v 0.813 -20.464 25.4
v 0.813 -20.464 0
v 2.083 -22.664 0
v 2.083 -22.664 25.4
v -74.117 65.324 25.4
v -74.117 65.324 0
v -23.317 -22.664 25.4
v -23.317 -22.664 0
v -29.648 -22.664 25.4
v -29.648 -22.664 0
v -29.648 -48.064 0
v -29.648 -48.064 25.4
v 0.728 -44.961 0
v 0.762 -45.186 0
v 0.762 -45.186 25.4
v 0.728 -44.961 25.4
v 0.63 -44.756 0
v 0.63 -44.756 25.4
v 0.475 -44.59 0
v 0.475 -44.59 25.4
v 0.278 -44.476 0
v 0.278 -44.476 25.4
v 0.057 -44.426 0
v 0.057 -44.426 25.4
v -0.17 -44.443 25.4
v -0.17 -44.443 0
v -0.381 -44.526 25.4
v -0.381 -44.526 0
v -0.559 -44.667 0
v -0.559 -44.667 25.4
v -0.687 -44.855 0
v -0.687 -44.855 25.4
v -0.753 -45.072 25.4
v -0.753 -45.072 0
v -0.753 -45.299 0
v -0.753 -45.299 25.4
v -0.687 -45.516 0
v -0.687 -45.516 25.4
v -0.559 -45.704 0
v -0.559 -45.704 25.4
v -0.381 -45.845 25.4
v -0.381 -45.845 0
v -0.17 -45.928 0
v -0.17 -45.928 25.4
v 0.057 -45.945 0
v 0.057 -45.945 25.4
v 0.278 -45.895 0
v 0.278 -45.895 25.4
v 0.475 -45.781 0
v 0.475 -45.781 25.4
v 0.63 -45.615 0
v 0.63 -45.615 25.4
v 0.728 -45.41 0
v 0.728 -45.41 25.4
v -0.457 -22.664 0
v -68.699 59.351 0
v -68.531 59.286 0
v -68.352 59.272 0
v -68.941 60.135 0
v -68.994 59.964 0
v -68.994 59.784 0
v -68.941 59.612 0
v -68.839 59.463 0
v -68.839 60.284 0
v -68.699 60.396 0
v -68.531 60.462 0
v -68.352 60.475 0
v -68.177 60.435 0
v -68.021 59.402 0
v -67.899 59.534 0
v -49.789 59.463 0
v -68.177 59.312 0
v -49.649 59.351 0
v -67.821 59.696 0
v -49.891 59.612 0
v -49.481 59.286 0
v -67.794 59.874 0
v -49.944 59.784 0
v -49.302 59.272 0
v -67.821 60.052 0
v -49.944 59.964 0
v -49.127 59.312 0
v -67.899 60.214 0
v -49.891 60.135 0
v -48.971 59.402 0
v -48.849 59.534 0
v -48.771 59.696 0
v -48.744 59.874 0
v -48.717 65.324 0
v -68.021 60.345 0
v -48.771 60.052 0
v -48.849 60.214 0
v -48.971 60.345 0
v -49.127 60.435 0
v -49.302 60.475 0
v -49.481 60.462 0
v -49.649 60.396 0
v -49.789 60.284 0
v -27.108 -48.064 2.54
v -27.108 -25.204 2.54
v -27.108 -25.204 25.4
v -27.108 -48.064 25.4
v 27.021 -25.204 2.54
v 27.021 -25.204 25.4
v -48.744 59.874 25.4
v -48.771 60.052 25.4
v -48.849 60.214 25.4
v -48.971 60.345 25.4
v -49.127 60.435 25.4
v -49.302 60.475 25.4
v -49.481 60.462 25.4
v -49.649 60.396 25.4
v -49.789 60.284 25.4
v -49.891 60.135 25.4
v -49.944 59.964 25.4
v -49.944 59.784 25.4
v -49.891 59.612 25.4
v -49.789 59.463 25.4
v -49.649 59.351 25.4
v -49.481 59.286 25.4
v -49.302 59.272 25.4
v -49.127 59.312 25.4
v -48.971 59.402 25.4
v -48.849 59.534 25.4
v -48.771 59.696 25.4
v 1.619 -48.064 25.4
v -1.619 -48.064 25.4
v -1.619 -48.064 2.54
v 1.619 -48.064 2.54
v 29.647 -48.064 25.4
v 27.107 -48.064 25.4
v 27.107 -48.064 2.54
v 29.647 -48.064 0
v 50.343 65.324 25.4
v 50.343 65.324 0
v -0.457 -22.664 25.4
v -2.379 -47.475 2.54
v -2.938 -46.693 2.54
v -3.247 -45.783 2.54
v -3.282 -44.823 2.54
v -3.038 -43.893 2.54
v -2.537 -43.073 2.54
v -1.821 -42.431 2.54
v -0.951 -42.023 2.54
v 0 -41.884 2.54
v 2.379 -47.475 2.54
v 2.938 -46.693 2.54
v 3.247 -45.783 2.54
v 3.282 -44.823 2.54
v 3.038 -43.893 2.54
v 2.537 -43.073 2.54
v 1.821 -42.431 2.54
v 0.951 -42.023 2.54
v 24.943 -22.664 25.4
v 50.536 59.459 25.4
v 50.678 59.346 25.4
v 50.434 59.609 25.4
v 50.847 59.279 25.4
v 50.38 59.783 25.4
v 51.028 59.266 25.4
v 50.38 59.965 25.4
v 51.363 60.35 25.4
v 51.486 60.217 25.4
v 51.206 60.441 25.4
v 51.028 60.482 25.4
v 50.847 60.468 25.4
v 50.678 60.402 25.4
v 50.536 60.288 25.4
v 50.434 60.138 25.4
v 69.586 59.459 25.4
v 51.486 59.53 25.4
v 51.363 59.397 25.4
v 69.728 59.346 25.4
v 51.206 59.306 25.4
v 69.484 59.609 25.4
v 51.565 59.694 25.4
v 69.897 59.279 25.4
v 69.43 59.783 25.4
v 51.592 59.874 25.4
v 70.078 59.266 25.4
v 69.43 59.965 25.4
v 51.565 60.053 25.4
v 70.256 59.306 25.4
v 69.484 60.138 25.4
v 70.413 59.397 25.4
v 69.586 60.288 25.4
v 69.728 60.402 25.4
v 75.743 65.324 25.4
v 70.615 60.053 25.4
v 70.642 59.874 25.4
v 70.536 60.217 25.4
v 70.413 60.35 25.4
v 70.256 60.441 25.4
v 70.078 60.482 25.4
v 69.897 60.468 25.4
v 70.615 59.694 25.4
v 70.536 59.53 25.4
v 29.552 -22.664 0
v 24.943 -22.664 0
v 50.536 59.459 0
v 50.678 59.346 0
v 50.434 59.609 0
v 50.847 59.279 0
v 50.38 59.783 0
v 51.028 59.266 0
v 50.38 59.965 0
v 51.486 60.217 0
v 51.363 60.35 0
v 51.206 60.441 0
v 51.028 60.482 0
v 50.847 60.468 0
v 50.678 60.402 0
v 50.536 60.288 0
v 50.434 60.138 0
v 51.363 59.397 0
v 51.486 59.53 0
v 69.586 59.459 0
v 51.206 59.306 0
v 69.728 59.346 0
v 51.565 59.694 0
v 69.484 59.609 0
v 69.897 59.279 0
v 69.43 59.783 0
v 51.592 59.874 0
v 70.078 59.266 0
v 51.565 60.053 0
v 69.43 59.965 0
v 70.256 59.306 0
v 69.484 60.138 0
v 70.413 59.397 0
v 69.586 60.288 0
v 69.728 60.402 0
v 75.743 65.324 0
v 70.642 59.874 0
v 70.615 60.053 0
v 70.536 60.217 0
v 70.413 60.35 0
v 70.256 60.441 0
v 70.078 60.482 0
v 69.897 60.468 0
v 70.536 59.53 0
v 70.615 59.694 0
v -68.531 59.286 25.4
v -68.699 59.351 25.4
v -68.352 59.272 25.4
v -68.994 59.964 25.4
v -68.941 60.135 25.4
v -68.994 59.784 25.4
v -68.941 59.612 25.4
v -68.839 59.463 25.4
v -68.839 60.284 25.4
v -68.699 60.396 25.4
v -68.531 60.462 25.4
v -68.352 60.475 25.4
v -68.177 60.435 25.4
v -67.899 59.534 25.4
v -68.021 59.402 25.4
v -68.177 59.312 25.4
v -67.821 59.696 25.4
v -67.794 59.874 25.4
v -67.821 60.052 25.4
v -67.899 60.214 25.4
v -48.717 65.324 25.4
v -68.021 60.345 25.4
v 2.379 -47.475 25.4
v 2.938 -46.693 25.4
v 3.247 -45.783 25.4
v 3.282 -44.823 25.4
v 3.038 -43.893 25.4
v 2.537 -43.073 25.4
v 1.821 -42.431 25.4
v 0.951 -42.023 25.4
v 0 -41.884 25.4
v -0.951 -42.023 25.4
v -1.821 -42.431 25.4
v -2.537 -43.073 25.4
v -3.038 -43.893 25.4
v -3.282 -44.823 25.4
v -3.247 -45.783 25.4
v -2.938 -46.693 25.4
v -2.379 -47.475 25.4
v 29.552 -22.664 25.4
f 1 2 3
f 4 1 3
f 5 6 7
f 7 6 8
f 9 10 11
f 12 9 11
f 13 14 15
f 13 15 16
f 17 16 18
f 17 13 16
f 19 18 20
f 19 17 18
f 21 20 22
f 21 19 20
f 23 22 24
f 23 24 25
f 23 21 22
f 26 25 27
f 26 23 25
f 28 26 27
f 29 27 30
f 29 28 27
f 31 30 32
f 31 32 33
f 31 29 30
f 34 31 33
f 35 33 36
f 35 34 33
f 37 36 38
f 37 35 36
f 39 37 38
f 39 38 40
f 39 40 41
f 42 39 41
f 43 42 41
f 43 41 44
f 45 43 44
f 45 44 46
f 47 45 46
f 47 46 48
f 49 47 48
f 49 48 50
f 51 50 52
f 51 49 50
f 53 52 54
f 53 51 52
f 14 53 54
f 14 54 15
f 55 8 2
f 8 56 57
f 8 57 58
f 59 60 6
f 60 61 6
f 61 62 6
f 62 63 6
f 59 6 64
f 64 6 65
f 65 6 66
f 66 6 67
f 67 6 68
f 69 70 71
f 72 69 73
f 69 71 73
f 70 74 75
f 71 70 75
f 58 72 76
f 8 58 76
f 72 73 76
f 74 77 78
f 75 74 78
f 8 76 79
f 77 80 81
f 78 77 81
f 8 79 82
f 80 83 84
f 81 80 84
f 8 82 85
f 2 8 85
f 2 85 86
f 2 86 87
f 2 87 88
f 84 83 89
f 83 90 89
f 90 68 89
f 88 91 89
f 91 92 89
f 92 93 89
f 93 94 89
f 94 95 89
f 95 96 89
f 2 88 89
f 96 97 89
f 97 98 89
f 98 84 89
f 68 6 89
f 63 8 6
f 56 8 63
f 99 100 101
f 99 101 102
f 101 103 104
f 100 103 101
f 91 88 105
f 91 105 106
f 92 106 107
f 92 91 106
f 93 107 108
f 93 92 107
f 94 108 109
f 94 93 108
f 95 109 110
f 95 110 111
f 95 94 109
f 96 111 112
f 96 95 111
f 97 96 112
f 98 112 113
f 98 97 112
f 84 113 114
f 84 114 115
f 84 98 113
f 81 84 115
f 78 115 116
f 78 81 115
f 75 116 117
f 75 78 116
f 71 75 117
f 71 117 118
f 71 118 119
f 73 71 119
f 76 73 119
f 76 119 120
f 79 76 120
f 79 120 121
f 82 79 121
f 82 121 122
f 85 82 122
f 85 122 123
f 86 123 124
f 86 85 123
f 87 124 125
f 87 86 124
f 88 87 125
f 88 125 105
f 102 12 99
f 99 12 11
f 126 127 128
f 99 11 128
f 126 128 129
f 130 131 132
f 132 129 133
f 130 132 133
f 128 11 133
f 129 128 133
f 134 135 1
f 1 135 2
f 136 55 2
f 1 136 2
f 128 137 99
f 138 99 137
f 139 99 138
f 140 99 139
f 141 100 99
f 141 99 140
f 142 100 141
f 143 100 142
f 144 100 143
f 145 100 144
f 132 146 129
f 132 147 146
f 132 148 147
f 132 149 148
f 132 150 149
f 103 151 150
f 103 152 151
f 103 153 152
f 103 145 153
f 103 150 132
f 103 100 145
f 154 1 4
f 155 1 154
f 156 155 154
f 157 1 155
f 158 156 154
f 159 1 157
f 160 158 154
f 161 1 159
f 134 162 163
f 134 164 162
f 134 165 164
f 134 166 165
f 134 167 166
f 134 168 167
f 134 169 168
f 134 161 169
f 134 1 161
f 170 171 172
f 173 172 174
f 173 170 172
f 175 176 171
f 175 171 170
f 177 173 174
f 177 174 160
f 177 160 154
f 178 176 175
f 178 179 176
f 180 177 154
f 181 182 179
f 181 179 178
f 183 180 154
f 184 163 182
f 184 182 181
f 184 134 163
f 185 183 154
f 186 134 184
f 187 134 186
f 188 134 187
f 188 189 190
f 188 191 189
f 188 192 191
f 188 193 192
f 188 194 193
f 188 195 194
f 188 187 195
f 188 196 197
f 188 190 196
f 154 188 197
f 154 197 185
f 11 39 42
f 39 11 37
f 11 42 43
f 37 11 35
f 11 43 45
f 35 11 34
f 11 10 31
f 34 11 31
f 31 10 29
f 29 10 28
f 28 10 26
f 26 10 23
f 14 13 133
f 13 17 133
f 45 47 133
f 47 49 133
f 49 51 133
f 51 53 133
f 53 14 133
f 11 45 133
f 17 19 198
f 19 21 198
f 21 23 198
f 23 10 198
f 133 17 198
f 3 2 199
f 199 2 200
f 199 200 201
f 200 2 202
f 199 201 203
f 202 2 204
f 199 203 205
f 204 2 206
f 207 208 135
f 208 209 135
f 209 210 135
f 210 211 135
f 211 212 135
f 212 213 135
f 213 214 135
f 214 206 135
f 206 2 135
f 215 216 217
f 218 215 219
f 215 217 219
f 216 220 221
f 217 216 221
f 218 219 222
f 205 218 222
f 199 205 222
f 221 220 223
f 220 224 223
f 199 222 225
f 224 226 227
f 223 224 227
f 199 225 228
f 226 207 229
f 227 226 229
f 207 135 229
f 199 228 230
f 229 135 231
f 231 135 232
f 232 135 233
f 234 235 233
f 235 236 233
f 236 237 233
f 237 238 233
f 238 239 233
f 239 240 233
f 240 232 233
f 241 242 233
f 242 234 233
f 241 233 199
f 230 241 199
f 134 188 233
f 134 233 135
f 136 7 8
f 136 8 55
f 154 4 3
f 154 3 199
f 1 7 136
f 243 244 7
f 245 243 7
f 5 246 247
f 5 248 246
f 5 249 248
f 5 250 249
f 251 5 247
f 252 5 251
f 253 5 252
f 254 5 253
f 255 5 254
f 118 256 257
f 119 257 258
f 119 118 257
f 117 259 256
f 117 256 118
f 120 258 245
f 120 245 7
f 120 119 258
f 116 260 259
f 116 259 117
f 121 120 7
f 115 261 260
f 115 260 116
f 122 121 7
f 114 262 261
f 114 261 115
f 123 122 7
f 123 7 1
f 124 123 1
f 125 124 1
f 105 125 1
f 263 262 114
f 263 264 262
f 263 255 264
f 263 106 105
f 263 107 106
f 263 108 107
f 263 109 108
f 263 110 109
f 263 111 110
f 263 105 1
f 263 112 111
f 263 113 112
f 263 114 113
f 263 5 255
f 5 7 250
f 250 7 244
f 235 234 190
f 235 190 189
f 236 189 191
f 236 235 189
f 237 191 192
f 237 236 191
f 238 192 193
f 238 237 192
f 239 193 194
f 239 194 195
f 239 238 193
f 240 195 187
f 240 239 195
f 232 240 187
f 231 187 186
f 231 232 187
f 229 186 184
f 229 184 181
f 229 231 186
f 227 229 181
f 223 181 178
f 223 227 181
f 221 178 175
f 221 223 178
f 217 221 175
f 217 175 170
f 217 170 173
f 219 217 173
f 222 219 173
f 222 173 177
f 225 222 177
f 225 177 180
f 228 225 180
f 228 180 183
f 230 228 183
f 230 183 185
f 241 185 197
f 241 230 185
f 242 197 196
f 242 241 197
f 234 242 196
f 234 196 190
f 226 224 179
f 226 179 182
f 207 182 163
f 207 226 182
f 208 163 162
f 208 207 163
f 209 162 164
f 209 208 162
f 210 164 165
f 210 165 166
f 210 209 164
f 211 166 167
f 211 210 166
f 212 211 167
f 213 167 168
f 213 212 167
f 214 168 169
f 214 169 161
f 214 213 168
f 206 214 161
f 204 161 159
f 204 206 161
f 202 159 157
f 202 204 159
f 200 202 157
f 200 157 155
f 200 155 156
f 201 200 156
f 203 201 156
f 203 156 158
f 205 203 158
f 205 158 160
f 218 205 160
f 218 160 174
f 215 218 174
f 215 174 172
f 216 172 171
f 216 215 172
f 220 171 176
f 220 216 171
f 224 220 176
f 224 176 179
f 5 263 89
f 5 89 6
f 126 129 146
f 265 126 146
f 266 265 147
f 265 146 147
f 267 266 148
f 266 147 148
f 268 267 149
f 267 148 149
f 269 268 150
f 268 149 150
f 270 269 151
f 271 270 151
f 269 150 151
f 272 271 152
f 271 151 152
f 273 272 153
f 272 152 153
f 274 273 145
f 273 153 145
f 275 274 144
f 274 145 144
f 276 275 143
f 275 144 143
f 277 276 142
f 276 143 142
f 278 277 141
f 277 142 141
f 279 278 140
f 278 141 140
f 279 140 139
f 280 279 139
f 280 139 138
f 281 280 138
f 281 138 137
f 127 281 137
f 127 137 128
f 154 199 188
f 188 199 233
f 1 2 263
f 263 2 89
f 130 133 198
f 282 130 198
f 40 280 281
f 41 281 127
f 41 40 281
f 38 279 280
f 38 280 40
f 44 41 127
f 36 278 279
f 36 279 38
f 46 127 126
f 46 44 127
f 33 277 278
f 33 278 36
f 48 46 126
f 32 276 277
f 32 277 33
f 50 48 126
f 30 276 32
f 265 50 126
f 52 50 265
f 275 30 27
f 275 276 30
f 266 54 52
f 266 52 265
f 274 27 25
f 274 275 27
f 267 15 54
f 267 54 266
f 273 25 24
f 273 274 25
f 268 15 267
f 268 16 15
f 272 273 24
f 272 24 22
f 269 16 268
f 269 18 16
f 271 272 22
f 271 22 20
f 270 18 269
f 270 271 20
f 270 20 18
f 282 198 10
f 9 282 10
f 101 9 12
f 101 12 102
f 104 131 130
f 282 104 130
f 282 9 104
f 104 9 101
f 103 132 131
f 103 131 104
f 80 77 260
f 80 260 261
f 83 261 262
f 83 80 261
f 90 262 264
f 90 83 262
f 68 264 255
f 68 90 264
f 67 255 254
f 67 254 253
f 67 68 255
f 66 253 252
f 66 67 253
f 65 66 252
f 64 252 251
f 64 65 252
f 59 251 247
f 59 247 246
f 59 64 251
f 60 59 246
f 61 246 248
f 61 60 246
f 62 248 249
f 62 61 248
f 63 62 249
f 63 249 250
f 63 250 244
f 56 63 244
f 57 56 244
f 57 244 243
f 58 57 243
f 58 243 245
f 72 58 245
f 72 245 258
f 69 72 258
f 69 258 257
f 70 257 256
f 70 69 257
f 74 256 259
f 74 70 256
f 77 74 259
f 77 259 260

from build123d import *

# Parameters (mm, degrees)
F0_R     = 0.60325
F1_DEPTH = 25.4
F0_R_2   = 0.6096
F2_DEPTH = 25.4
F0_W     = 58.928
F0_H     = 25.1030587018
F0_R_3   = 0.762
F3_DEPTH = 25.4
F4_T     = 2.54


# Not quite as in the source:
# - a shell that OpenCascade refuses in one call is made with other operations: the cavity is built on its own and cut out


with BuildPart() as f1:
    # F0 (on Top) → F1 (new body)
    with BuildSketch(Plane.XY):
        Polygon((-74.1166336828, 65.3244355693), (-23.3166336828, -22.6637454552), (-0.4566336828, -22.6637454552), (0.8133663172, -20.4640409296), (-48.7166336828, 65.3244355693), align=None)
        with Locations((-68.3971781588, 59.8737336695)):
            Circle(F0_R, mode=Mode.SUBTRACT)
        with Locations((-49.3471781588, 59.8737336695)):
            Circle(F0_R, mode=Mode.SUBTRACT)
    extrude(amount=F1_DEPTH)


with BuildPart() as f1b:
    # F0 (on Top) → F1, piece 2 (new body)
    with BuildSketch(Plane.XY):
        Polygon((0.8133663172, -20.4640409296), (2.0833663172, -22.6637454552), (24.9433663172, -22.6637454552), (75.7433663172, 65.3244355693), (50.3433663172, 65.3244355693), align=None)
        with Locations((50.9828218412, 59.8737336695)):
            Circle(F0_R_2, mode=Mode.SUBTRACT)
        with Locations((70.0328218412, 59.8737336695)):
            Circle(F0_R_2, mode=Mode.SUBTRACT)
    extrude(amount=F1_DEPTH)


with BuildPart() as f2:
    # F0 (on Top) → F2 (new body)
    with BuildSketch(Plane.XY):
        Polygon((-23.3166336828, -22.6637454552), (-29.6483605915, -22.6637454552), (-29.6483605915, -48.0635650456), (-29.464, -48.0635650456), (-29.464, -22.9605063438), (29.464, -22.9605063438), (29.464, -48.0635650456), (29.6472443531, -48.0635650456), (29.5515115134, -22.6637454552), (24.9433663172, -22.6637454552), (2.0833663172, -22.6637454552), (-0.4566336828, -22.6637454552), align=None)
    extrude(amount=F2_DEPTH)

    # F0 (on Top) → F3 (join)
    with BuildSketch(Plane.XY):
        with Locations((0, -35.5120356947)):
            Rectangle(F0_W, F0_H)
        with Locations((0, -45.1855063438)):
            Circle(F0_R_3, mode=Mode.SUBTRACT)
    extrude(amount=F3_DEPTH)

    # F4: shell of thickness 2.54, made by hand


with BuildPart() as f4_core1:
    # F4_t2: copy of F2
    add(f2.part)

    # the walls: a layer under each face that stays
    f4_faces = [f4_core1.faces().sort_by_distance(p)[0] for p in [
        (-0.048424539, -22.6637454552, 12.7),
        (-0.0005581192, -35.3636552504, 0),
        (-0.762, -45.1855063438, 12.7),
        (-29.6483605915, -35.3636552504, 12.7),
        (29.5993779332, -35.3636552504, 12.7),
    ]]
    thicken(f4_faces, amount=-F4_T, mode=Mode.SUBTRACT)


with BuildPart() as f2_1:
    add(f2.part)

    # what is left inside the walls is the cavity
    f4_cavity = [f4_core1.part.solids().sort_by_distance(p)[0] for p in [
        (-0.043647, -25.229145, 17.78),
    ]]
    add(f4_cavity, mode=Mode.SUBTRACT)


solid = Compound([f1.part, f1b.part, f2_1.part])
